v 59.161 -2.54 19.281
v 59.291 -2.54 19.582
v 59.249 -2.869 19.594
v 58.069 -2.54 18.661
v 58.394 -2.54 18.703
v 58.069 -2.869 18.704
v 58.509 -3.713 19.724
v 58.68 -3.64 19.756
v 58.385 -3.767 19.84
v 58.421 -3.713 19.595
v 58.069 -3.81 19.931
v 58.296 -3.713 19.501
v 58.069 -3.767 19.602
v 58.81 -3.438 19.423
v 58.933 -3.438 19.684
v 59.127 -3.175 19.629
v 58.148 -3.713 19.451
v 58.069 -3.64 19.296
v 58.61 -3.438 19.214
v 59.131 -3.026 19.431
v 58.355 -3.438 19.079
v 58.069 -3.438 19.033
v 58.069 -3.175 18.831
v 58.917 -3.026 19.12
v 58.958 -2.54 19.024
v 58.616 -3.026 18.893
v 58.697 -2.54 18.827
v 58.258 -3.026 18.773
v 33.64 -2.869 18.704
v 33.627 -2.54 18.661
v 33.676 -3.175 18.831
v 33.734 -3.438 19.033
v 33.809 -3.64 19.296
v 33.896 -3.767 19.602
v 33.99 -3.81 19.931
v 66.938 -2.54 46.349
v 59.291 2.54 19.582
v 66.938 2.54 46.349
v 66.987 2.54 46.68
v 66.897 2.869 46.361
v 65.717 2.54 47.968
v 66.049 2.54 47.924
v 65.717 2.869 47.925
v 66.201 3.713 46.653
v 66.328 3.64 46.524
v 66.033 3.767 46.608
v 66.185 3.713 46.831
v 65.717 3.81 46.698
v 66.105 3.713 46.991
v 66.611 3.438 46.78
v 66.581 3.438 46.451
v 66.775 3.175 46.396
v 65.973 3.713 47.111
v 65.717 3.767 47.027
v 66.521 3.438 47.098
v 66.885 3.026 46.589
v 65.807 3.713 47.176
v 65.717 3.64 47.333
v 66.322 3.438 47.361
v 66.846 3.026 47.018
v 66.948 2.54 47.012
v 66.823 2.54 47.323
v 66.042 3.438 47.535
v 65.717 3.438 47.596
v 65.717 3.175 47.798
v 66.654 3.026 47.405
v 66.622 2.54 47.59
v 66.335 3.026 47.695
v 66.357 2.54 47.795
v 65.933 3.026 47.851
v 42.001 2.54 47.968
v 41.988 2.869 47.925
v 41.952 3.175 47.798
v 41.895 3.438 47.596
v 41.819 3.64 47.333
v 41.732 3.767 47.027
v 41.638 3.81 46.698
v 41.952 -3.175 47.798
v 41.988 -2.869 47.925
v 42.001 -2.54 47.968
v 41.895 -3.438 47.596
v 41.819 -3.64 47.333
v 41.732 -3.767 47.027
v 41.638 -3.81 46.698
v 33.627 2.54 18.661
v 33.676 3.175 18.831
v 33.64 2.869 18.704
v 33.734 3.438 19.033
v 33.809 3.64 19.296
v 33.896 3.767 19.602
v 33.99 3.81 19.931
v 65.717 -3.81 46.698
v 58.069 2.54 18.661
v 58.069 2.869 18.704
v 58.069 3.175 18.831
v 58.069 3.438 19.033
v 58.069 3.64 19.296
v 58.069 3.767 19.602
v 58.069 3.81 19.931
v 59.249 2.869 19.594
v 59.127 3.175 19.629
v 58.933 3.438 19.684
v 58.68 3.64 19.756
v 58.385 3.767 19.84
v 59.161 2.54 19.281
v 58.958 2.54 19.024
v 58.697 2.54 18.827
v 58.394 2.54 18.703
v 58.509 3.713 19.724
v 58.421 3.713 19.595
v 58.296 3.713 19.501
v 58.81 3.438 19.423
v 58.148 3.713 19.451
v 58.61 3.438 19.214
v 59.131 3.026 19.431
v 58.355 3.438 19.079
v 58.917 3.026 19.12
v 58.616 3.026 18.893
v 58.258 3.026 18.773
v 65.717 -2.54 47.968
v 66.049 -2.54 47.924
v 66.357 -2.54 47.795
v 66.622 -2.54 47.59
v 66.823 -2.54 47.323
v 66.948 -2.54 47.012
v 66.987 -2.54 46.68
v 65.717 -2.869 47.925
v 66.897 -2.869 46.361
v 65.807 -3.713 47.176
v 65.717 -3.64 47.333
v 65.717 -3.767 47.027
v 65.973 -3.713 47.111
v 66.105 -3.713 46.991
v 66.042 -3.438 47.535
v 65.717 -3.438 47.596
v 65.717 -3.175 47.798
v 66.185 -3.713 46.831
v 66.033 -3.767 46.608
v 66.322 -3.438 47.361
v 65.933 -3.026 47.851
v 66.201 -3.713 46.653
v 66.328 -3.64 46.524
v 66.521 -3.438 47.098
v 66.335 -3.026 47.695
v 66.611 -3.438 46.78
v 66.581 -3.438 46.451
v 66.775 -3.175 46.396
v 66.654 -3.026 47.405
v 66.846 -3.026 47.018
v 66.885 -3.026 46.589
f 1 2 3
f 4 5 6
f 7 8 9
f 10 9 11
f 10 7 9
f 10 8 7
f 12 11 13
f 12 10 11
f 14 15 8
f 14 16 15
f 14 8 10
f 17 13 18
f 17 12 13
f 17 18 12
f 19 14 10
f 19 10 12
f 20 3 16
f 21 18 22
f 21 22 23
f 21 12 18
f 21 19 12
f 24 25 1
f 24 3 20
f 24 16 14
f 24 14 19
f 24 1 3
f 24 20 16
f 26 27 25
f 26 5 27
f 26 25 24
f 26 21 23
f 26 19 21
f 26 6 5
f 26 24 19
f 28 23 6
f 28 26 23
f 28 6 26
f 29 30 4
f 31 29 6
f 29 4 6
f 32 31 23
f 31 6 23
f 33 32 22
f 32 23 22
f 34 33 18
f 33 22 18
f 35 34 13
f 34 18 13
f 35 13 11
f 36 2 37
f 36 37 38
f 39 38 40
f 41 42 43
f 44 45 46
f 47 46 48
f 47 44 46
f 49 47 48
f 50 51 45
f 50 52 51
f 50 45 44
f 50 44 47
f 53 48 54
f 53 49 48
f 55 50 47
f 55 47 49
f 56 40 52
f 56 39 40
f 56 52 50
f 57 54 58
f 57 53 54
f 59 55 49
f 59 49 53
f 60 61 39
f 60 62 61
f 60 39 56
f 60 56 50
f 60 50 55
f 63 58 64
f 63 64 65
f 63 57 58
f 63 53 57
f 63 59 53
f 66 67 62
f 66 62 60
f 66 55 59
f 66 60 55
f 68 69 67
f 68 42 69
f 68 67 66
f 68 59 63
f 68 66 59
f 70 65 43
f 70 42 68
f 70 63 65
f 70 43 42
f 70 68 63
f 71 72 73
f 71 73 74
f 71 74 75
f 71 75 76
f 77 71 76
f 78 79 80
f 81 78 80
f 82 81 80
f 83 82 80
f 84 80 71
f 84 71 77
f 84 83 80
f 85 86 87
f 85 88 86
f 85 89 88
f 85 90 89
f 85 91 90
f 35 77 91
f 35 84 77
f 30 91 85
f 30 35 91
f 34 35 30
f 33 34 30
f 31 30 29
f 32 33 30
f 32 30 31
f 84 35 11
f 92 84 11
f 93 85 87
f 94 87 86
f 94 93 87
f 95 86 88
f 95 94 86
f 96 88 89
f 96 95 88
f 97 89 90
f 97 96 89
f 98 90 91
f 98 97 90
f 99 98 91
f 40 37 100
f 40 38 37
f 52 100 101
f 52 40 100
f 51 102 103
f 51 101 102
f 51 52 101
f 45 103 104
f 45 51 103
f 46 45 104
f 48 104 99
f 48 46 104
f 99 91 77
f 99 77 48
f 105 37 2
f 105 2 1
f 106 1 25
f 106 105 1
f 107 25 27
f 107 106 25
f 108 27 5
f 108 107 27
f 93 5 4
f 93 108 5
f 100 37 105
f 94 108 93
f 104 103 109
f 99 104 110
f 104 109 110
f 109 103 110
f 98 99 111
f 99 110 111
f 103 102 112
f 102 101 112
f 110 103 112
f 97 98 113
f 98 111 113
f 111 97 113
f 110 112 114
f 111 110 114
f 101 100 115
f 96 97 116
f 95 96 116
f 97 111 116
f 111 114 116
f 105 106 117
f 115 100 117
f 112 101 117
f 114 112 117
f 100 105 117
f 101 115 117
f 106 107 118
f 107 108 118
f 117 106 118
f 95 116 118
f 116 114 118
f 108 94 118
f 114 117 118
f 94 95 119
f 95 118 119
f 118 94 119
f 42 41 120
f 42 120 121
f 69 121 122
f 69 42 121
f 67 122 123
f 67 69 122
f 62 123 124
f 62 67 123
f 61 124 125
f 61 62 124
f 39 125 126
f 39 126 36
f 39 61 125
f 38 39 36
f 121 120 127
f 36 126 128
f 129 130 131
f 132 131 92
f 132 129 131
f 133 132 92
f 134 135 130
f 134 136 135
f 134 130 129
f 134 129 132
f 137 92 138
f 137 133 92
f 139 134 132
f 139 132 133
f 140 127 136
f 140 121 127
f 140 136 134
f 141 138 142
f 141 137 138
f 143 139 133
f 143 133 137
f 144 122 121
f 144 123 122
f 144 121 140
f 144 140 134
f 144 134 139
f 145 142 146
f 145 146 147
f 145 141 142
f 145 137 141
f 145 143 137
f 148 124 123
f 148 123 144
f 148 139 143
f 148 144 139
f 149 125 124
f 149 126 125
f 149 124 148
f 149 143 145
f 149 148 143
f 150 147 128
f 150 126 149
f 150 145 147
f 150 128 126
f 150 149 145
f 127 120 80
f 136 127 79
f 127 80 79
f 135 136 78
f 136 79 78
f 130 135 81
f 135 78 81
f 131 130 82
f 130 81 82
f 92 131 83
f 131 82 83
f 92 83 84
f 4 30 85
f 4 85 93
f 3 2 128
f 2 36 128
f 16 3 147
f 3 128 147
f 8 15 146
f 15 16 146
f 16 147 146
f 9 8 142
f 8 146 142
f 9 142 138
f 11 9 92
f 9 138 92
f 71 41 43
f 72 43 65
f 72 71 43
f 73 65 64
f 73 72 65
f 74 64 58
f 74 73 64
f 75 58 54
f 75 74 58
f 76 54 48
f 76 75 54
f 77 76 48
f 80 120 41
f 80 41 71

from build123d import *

# Parameters (mm, degrees)
F3_DEPTH = 3.81
F4_R     = 1.27


# Not quite as in the source:
# - the program builds the solid bodies; features that only make, move or delete a surface that nothing else refers to are left out


with BuildPart() as f3:
    # F2 (on Front) → F3 (new body, symmetric)
    with BuildSketch(Plane.XZ):
        Polygon((67.4008423153, 47.9680152879), (42.0008423153, 47.9680152879), (33.6273413479, 18.6607656464), (59.0273413479, 18.6607656464), align=None)
    extrude(amount=F3_DEPTH, both=True)

    # F4
    f4_edges = [f3.edges().sort_by_distance(p)[0] for p in [
        (54.700842, -3.81, 47.968015),
        (63.214092, -3.81, 33.31439),
        (46.327341, -3.81, 18.660766),
        (63.214092, 3.81, 33.31439),
        (54.700842, 3.81, 47.968015),
        (46.327341, 3.81, 18.660766),
        (67.400842, 0, 47.968015),
        (59.027341, 0, 18.660766),
    ]]
    fillet(f4_edges, radius=F4_R)


solid = f3.part
